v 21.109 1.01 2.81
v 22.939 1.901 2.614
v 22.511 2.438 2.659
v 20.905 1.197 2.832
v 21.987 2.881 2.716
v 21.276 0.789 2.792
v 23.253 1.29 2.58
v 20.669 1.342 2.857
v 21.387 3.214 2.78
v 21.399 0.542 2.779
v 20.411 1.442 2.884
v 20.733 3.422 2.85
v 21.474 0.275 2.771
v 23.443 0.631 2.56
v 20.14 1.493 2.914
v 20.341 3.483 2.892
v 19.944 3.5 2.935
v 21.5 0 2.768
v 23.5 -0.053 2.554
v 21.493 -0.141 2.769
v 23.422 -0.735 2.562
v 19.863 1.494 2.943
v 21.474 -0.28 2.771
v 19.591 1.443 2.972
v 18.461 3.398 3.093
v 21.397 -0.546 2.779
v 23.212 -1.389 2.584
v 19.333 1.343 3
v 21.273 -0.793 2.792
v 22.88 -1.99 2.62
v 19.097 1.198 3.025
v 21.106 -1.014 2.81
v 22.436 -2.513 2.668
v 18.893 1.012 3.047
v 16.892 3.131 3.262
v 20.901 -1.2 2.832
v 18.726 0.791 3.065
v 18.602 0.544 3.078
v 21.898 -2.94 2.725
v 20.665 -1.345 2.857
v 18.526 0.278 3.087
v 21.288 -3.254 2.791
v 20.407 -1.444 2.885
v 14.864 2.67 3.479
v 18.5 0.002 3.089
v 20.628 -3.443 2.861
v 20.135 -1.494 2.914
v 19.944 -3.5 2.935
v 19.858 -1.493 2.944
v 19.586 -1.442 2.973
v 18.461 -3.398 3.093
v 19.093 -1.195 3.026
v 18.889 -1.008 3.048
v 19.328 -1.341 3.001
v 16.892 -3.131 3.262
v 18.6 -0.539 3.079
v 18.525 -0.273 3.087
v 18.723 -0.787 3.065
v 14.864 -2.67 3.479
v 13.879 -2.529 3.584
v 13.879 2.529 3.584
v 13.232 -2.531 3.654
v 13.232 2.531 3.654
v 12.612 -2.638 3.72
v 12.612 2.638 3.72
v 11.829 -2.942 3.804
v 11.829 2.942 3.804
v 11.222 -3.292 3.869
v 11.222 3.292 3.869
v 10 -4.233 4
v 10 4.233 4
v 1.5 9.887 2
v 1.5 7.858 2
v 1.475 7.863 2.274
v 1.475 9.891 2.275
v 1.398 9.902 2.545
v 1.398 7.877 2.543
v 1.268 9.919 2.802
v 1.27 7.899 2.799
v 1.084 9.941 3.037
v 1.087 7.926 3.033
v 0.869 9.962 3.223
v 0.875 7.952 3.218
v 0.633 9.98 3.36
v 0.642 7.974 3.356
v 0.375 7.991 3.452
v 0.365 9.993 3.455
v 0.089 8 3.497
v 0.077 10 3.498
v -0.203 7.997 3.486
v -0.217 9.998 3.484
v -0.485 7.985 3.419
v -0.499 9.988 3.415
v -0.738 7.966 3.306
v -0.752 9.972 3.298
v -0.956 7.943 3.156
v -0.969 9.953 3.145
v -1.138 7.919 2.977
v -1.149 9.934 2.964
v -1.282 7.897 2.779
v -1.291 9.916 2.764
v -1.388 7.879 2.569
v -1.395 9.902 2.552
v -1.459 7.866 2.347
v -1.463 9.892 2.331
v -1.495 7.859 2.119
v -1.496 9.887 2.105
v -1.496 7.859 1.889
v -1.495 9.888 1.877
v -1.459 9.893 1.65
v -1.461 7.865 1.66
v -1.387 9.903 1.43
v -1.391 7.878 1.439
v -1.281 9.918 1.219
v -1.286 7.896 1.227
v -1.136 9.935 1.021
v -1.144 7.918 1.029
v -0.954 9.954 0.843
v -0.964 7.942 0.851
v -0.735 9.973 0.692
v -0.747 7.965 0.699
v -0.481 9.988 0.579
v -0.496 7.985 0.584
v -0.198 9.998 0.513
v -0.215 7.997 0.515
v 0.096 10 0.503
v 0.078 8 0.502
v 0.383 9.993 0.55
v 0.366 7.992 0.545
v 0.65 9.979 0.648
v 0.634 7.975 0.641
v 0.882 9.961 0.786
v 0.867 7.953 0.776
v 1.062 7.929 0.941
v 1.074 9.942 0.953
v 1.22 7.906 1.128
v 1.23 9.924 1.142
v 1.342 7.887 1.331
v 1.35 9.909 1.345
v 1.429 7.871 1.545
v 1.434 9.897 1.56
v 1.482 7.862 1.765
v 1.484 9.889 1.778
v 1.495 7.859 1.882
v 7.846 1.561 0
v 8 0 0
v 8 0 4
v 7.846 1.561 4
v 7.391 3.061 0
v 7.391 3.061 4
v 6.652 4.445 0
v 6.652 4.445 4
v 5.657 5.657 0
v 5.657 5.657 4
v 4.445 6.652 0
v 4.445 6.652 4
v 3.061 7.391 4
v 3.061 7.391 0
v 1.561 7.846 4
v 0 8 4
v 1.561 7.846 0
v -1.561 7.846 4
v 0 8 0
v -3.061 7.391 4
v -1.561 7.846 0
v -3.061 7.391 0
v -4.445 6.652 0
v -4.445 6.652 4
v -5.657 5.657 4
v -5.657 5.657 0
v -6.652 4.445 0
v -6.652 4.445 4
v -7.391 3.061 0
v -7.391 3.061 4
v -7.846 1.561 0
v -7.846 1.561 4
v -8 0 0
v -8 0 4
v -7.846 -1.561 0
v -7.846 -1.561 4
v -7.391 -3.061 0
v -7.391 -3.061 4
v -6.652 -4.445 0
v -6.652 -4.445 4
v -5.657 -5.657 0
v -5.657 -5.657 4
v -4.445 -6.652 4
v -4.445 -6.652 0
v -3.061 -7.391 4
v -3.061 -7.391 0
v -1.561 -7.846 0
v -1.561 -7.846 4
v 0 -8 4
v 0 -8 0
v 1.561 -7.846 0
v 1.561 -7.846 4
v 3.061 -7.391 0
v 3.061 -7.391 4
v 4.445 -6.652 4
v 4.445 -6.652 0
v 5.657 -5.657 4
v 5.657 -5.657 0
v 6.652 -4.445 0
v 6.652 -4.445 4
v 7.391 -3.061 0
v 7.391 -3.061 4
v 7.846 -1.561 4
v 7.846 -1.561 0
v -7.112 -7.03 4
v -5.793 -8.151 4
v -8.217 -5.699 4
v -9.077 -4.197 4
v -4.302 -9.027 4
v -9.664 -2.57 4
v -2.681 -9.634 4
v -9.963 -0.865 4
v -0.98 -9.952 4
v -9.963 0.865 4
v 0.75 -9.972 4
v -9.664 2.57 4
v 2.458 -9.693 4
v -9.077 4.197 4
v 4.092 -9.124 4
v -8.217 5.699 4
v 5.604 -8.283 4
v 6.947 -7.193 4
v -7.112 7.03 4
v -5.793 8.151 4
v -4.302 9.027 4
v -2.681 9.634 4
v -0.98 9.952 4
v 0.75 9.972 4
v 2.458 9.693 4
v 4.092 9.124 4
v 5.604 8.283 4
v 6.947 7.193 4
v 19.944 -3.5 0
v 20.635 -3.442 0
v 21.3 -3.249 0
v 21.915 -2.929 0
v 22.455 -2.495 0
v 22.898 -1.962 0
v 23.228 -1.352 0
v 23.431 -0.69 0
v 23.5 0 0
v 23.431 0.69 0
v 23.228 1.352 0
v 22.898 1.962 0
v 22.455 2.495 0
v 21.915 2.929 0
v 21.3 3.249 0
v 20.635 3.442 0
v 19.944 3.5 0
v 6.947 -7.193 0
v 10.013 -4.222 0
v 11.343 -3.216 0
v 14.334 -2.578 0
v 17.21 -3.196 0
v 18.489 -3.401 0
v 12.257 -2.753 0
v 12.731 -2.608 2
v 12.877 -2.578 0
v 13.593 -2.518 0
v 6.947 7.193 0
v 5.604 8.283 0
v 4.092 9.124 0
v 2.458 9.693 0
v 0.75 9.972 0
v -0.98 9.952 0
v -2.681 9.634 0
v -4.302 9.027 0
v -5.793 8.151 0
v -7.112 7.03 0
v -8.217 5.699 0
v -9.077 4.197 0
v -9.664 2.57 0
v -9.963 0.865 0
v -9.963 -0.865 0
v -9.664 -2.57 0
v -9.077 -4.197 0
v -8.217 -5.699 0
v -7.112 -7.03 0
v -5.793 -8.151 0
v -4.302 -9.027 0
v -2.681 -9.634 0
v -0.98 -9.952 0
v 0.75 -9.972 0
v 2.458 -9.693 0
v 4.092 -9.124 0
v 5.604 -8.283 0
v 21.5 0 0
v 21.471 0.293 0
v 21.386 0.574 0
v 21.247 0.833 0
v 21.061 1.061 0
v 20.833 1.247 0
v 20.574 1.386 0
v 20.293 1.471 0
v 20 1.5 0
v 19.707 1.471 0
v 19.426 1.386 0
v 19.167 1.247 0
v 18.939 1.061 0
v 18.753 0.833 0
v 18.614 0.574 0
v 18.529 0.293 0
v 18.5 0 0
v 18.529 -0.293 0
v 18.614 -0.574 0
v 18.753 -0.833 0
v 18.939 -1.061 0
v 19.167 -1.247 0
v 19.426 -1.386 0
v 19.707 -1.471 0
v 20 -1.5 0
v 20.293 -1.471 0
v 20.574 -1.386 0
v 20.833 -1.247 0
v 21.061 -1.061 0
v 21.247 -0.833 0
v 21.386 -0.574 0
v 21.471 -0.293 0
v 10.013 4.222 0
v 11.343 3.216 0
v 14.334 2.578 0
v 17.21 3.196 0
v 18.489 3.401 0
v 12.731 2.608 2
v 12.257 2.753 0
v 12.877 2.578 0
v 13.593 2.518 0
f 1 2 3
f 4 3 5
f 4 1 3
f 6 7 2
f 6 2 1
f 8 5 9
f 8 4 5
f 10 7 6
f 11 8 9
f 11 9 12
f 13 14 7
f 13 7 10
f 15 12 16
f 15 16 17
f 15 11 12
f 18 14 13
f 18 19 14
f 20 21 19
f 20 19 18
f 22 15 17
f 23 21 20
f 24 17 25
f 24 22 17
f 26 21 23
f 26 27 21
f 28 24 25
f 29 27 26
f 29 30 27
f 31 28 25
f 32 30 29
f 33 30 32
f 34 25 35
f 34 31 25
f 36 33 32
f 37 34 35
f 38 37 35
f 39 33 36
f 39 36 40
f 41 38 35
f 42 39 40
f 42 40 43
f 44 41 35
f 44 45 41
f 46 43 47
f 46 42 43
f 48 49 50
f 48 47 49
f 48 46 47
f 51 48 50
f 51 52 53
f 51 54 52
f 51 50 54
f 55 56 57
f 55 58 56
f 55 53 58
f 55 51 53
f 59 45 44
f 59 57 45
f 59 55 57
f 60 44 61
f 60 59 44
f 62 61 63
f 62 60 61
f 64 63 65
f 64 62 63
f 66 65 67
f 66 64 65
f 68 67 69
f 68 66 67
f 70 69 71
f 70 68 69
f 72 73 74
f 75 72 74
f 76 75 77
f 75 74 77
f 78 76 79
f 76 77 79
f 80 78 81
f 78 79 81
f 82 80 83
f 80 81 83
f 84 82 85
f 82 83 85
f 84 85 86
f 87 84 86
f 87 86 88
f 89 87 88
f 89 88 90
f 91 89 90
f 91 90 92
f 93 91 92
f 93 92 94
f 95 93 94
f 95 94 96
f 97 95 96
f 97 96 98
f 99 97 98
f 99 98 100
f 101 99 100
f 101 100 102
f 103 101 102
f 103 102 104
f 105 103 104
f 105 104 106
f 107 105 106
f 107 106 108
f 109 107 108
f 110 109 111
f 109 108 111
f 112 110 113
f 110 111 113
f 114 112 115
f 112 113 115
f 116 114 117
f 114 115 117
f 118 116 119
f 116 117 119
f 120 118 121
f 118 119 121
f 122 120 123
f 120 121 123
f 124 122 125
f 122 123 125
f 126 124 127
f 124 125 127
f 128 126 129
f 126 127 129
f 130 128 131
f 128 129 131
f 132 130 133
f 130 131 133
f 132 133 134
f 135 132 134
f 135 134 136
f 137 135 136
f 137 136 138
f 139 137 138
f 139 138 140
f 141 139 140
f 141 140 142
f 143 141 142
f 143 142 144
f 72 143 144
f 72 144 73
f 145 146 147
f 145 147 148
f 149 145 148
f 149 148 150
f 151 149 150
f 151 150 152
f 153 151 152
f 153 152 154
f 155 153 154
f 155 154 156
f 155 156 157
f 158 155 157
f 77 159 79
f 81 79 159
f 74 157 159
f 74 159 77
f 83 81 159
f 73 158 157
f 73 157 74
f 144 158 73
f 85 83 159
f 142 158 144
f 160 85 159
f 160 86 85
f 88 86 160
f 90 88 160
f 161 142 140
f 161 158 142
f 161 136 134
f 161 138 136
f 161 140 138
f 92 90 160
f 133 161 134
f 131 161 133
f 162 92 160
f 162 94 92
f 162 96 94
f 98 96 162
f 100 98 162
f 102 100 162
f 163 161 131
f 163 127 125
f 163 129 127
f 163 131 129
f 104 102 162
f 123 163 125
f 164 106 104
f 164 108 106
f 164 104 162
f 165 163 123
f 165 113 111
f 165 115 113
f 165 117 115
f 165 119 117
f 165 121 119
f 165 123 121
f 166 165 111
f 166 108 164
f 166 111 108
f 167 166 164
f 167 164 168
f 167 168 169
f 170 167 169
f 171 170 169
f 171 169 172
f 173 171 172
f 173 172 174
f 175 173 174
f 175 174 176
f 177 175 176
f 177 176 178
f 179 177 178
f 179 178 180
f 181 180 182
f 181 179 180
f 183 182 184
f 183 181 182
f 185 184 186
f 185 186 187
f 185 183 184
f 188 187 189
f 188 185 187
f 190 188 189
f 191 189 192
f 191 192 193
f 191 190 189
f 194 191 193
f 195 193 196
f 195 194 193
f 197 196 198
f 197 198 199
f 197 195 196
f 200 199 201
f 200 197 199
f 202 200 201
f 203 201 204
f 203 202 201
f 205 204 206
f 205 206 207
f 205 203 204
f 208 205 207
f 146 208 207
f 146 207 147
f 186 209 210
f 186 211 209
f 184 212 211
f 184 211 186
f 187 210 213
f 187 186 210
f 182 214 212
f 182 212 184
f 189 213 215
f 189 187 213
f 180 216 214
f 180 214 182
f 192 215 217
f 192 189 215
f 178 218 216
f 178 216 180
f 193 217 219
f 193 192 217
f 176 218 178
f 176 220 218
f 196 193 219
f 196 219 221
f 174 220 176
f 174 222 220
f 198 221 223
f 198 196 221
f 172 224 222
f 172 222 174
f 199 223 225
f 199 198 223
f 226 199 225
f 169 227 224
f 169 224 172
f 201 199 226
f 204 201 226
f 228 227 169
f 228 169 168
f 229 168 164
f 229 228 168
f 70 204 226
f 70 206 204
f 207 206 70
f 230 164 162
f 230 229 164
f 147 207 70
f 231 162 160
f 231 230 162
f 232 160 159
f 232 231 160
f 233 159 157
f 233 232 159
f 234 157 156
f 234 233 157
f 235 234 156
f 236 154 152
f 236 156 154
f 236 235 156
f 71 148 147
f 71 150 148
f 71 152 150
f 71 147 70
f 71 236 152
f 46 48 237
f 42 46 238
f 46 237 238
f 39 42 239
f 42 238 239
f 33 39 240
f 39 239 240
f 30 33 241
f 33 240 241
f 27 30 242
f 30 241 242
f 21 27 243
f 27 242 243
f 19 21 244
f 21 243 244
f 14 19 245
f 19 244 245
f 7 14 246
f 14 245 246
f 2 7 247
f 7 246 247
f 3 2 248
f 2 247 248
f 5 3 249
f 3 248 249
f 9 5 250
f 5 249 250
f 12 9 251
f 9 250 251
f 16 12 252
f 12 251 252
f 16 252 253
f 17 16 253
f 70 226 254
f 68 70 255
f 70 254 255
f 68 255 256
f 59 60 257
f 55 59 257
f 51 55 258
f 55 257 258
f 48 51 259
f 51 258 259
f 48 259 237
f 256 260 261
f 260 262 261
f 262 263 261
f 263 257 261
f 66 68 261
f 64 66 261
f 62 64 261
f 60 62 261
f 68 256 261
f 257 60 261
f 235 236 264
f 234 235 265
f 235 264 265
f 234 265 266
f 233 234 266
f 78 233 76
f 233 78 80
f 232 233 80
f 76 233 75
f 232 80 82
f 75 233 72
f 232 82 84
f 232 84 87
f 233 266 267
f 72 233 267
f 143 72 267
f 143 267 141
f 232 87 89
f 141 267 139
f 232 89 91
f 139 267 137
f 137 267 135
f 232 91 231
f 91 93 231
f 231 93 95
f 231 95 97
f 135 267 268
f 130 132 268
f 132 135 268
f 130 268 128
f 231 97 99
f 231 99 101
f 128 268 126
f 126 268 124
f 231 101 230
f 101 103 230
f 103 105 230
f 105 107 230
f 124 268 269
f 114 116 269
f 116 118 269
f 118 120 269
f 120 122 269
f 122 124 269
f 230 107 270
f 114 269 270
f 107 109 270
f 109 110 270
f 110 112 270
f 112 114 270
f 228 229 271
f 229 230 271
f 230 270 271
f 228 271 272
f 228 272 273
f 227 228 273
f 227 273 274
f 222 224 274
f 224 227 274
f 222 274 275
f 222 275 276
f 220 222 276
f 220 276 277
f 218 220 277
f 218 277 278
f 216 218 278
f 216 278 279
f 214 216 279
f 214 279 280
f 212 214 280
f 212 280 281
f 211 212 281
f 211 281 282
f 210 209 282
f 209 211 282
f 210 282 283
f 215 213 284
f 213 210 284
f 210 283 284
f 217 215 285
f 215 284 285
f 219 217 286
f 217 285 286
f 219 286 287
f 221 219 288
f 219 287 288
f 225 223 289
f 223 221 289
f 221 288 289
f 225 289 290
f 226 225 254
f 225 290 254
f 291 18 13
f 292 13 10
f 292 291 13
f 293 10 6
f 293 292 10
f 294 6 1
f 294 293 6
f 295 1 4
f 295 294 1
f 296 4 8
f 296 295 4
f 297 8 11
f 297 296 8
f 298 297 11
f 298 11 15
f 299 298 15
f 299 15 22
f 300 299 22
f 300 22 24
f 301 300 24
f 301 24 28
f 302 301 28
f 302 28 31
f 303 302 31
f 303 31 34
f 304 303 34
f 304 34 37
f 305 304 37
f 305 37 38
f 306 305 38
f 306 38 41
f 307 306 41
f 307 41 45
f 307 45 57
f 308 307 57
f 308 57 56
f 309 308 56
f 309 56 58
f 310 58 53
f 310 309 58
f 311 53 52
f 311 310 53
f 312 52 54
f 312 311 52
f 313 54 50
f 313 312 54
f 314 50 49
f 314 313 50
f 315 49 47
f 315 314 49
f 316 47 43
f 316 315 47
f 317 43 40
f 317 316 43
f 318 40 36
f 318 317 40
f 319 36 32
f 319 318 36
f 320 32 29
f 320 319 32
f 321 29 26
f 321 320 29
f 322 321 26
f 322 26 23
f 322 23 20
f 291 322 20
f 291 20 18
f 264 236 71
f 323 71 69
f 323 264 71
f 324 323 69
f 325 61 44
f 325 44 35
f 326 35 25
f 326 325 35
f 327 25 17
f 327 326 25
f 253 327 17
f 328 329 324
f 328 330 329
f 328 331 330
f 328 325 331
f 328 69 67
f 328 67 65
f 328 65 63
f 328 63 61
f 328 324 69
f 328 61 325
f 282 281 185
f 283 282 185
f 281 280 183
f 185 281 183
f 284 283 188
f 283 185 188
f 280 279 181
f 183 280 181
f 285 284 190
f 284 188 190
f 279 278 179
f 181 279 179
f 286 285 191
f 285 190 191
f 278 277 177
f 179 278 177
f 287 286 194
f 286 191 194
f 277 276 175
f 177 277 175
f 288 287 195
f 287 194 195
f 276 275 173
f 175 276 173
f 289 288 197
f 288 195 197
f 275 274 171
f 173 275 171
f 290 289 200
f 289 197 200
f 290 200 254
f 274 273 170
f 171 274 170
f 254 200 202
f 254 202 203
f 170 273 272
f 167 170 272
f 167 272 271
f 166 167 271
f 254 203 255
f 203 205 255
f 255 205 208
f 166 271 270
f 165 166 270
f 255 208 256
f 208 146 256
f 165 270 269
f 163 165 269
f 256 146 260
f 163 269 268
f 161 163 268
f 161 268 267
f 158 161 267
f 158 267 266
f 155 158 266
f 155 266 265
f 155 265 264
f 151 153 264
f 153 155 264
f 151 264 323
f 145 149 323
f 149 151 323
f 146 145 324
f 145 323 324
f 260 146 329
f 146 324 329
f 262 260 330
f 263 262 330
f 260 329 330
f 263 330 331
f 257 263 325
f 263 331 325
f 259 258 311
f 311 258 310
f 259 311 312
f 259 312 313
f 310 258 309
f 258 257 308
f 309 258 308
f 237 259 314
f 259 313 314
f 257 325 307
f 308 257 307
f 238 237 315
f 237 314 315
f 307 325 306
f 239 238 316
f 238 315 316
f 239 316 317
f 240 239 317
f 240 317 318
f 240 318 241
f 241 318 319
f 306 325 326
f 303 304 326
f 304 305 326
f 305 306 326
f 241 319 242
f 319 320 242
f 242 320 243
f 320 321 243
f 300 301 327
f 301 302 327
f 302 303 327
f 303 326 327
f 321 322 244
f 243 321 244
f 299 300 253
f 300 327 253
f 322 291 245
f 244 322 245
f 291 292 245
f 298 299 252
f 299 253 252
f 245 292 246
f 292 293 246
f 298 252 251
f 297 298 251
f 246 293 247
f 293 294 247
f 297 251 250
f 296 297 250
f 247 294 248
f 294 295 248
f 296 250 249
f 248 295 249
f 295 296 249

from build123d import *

# Parameters (mm, degrees)
F0_R     = 8
F0_R_2   = 1.5
F1_DEPTH = 4
F2_R     = 1.5
F3_DEPTH = 25
F5_DEPTH = 12.5


with BuildPart() as f1:
    # F0 (on Top) → F1 (new body)
    with BuildSketch(Plane.XY):
        with BuildLine():
            ThreePointArc((6.9474552963, -7.192556215), (9.2052852472, -3.9067535779), (10, 0))
            ThreePointArc((10, 0), (9.2052852472, 3.9067535779), (6.9474552963, 7.192556215))
            ThreePointArc((6.9474552963, 7.192556215), (-10, 0), (6.9474552963, -7.192556215))
        make_face()
        Circle(F0_R, mode=Mode.SUBTRACT)
        with BuildLine():
            ThreePointArc((6.9474552963, 7.192556215), (9.2052852472, 3.9067535779), (10, 0))
            ThreePointArc((10, 0), (9.2052852472, -3.9067535779), (6.9474552963, -7.192556215))
            add(Edge.make_bspline(
                [(6.9474552963, -7.192556215), (8.9911078661, -5.2185452451), (12.67340799, -0.8916241092), (16.5269435239, -3.4447773085), (19.9439029761, -3.4995504174)],
                knots=[0, 0, 0, 0, 0.5019027854, 1, 1, 1, 1], degree=3))
            ThreePointArc((19.9439029761, -3.4995504174), (16.5, 0), (19.9439029761, 3.4995504174))
            add(Edge.make_bspline(
                [(6.9474552963, 7.192556215), (8.9911078661, 5.2185452451), (12.67340799, 0.8916241092), (16.5269435239, 3.4447773085), (19.9439029761, 3.4995504174)],
                knots=[0, 0, 0, 0, 0.5019027854, 1, 1, 1, 1], degree=3))
        make_face()
        with BuildLine():
            ThreePointArc((23.5, 0), (22.4549603272, 2.4946281871), (19.9439029761, 3.4995504174))
            ThreePointArc((19.9439029761, 3.4995504174), (16.5, 0), (19.9439029761, -3.4995504174))
            ThreePointArc((19.9439029761, -3.4995504174), (22.4549603272, -2.4946281871), (23.5, 0))
        make_face()
        with Locations((20, 0)):
            Circle(F0_R_2, mode=Mode.SUBTRACT)
    extrude(amount=F1_DEPTH)

    # F2 (on Front) → F3 (cut)
    with BuildSketch(Plane.XZ):
        with Locations((0, 2)):
            Circle(F2_R)
    extrude(amount=-F3_DEPTH, mode=Mode.SUBTRACT)

    # F4 (on Front) → F5 (intersect, symmetric)
    with BuildSketch(Plane.XZ):
        Polygon((10, 4), (-10, 4), (-10, -3.1432664791), (24, -2.6836021327), (24, 2.5), align=None)
    extrude(amount=F5_DEPTH, both=True, mode=Mode.INTERSECT)


solid = f1.part
